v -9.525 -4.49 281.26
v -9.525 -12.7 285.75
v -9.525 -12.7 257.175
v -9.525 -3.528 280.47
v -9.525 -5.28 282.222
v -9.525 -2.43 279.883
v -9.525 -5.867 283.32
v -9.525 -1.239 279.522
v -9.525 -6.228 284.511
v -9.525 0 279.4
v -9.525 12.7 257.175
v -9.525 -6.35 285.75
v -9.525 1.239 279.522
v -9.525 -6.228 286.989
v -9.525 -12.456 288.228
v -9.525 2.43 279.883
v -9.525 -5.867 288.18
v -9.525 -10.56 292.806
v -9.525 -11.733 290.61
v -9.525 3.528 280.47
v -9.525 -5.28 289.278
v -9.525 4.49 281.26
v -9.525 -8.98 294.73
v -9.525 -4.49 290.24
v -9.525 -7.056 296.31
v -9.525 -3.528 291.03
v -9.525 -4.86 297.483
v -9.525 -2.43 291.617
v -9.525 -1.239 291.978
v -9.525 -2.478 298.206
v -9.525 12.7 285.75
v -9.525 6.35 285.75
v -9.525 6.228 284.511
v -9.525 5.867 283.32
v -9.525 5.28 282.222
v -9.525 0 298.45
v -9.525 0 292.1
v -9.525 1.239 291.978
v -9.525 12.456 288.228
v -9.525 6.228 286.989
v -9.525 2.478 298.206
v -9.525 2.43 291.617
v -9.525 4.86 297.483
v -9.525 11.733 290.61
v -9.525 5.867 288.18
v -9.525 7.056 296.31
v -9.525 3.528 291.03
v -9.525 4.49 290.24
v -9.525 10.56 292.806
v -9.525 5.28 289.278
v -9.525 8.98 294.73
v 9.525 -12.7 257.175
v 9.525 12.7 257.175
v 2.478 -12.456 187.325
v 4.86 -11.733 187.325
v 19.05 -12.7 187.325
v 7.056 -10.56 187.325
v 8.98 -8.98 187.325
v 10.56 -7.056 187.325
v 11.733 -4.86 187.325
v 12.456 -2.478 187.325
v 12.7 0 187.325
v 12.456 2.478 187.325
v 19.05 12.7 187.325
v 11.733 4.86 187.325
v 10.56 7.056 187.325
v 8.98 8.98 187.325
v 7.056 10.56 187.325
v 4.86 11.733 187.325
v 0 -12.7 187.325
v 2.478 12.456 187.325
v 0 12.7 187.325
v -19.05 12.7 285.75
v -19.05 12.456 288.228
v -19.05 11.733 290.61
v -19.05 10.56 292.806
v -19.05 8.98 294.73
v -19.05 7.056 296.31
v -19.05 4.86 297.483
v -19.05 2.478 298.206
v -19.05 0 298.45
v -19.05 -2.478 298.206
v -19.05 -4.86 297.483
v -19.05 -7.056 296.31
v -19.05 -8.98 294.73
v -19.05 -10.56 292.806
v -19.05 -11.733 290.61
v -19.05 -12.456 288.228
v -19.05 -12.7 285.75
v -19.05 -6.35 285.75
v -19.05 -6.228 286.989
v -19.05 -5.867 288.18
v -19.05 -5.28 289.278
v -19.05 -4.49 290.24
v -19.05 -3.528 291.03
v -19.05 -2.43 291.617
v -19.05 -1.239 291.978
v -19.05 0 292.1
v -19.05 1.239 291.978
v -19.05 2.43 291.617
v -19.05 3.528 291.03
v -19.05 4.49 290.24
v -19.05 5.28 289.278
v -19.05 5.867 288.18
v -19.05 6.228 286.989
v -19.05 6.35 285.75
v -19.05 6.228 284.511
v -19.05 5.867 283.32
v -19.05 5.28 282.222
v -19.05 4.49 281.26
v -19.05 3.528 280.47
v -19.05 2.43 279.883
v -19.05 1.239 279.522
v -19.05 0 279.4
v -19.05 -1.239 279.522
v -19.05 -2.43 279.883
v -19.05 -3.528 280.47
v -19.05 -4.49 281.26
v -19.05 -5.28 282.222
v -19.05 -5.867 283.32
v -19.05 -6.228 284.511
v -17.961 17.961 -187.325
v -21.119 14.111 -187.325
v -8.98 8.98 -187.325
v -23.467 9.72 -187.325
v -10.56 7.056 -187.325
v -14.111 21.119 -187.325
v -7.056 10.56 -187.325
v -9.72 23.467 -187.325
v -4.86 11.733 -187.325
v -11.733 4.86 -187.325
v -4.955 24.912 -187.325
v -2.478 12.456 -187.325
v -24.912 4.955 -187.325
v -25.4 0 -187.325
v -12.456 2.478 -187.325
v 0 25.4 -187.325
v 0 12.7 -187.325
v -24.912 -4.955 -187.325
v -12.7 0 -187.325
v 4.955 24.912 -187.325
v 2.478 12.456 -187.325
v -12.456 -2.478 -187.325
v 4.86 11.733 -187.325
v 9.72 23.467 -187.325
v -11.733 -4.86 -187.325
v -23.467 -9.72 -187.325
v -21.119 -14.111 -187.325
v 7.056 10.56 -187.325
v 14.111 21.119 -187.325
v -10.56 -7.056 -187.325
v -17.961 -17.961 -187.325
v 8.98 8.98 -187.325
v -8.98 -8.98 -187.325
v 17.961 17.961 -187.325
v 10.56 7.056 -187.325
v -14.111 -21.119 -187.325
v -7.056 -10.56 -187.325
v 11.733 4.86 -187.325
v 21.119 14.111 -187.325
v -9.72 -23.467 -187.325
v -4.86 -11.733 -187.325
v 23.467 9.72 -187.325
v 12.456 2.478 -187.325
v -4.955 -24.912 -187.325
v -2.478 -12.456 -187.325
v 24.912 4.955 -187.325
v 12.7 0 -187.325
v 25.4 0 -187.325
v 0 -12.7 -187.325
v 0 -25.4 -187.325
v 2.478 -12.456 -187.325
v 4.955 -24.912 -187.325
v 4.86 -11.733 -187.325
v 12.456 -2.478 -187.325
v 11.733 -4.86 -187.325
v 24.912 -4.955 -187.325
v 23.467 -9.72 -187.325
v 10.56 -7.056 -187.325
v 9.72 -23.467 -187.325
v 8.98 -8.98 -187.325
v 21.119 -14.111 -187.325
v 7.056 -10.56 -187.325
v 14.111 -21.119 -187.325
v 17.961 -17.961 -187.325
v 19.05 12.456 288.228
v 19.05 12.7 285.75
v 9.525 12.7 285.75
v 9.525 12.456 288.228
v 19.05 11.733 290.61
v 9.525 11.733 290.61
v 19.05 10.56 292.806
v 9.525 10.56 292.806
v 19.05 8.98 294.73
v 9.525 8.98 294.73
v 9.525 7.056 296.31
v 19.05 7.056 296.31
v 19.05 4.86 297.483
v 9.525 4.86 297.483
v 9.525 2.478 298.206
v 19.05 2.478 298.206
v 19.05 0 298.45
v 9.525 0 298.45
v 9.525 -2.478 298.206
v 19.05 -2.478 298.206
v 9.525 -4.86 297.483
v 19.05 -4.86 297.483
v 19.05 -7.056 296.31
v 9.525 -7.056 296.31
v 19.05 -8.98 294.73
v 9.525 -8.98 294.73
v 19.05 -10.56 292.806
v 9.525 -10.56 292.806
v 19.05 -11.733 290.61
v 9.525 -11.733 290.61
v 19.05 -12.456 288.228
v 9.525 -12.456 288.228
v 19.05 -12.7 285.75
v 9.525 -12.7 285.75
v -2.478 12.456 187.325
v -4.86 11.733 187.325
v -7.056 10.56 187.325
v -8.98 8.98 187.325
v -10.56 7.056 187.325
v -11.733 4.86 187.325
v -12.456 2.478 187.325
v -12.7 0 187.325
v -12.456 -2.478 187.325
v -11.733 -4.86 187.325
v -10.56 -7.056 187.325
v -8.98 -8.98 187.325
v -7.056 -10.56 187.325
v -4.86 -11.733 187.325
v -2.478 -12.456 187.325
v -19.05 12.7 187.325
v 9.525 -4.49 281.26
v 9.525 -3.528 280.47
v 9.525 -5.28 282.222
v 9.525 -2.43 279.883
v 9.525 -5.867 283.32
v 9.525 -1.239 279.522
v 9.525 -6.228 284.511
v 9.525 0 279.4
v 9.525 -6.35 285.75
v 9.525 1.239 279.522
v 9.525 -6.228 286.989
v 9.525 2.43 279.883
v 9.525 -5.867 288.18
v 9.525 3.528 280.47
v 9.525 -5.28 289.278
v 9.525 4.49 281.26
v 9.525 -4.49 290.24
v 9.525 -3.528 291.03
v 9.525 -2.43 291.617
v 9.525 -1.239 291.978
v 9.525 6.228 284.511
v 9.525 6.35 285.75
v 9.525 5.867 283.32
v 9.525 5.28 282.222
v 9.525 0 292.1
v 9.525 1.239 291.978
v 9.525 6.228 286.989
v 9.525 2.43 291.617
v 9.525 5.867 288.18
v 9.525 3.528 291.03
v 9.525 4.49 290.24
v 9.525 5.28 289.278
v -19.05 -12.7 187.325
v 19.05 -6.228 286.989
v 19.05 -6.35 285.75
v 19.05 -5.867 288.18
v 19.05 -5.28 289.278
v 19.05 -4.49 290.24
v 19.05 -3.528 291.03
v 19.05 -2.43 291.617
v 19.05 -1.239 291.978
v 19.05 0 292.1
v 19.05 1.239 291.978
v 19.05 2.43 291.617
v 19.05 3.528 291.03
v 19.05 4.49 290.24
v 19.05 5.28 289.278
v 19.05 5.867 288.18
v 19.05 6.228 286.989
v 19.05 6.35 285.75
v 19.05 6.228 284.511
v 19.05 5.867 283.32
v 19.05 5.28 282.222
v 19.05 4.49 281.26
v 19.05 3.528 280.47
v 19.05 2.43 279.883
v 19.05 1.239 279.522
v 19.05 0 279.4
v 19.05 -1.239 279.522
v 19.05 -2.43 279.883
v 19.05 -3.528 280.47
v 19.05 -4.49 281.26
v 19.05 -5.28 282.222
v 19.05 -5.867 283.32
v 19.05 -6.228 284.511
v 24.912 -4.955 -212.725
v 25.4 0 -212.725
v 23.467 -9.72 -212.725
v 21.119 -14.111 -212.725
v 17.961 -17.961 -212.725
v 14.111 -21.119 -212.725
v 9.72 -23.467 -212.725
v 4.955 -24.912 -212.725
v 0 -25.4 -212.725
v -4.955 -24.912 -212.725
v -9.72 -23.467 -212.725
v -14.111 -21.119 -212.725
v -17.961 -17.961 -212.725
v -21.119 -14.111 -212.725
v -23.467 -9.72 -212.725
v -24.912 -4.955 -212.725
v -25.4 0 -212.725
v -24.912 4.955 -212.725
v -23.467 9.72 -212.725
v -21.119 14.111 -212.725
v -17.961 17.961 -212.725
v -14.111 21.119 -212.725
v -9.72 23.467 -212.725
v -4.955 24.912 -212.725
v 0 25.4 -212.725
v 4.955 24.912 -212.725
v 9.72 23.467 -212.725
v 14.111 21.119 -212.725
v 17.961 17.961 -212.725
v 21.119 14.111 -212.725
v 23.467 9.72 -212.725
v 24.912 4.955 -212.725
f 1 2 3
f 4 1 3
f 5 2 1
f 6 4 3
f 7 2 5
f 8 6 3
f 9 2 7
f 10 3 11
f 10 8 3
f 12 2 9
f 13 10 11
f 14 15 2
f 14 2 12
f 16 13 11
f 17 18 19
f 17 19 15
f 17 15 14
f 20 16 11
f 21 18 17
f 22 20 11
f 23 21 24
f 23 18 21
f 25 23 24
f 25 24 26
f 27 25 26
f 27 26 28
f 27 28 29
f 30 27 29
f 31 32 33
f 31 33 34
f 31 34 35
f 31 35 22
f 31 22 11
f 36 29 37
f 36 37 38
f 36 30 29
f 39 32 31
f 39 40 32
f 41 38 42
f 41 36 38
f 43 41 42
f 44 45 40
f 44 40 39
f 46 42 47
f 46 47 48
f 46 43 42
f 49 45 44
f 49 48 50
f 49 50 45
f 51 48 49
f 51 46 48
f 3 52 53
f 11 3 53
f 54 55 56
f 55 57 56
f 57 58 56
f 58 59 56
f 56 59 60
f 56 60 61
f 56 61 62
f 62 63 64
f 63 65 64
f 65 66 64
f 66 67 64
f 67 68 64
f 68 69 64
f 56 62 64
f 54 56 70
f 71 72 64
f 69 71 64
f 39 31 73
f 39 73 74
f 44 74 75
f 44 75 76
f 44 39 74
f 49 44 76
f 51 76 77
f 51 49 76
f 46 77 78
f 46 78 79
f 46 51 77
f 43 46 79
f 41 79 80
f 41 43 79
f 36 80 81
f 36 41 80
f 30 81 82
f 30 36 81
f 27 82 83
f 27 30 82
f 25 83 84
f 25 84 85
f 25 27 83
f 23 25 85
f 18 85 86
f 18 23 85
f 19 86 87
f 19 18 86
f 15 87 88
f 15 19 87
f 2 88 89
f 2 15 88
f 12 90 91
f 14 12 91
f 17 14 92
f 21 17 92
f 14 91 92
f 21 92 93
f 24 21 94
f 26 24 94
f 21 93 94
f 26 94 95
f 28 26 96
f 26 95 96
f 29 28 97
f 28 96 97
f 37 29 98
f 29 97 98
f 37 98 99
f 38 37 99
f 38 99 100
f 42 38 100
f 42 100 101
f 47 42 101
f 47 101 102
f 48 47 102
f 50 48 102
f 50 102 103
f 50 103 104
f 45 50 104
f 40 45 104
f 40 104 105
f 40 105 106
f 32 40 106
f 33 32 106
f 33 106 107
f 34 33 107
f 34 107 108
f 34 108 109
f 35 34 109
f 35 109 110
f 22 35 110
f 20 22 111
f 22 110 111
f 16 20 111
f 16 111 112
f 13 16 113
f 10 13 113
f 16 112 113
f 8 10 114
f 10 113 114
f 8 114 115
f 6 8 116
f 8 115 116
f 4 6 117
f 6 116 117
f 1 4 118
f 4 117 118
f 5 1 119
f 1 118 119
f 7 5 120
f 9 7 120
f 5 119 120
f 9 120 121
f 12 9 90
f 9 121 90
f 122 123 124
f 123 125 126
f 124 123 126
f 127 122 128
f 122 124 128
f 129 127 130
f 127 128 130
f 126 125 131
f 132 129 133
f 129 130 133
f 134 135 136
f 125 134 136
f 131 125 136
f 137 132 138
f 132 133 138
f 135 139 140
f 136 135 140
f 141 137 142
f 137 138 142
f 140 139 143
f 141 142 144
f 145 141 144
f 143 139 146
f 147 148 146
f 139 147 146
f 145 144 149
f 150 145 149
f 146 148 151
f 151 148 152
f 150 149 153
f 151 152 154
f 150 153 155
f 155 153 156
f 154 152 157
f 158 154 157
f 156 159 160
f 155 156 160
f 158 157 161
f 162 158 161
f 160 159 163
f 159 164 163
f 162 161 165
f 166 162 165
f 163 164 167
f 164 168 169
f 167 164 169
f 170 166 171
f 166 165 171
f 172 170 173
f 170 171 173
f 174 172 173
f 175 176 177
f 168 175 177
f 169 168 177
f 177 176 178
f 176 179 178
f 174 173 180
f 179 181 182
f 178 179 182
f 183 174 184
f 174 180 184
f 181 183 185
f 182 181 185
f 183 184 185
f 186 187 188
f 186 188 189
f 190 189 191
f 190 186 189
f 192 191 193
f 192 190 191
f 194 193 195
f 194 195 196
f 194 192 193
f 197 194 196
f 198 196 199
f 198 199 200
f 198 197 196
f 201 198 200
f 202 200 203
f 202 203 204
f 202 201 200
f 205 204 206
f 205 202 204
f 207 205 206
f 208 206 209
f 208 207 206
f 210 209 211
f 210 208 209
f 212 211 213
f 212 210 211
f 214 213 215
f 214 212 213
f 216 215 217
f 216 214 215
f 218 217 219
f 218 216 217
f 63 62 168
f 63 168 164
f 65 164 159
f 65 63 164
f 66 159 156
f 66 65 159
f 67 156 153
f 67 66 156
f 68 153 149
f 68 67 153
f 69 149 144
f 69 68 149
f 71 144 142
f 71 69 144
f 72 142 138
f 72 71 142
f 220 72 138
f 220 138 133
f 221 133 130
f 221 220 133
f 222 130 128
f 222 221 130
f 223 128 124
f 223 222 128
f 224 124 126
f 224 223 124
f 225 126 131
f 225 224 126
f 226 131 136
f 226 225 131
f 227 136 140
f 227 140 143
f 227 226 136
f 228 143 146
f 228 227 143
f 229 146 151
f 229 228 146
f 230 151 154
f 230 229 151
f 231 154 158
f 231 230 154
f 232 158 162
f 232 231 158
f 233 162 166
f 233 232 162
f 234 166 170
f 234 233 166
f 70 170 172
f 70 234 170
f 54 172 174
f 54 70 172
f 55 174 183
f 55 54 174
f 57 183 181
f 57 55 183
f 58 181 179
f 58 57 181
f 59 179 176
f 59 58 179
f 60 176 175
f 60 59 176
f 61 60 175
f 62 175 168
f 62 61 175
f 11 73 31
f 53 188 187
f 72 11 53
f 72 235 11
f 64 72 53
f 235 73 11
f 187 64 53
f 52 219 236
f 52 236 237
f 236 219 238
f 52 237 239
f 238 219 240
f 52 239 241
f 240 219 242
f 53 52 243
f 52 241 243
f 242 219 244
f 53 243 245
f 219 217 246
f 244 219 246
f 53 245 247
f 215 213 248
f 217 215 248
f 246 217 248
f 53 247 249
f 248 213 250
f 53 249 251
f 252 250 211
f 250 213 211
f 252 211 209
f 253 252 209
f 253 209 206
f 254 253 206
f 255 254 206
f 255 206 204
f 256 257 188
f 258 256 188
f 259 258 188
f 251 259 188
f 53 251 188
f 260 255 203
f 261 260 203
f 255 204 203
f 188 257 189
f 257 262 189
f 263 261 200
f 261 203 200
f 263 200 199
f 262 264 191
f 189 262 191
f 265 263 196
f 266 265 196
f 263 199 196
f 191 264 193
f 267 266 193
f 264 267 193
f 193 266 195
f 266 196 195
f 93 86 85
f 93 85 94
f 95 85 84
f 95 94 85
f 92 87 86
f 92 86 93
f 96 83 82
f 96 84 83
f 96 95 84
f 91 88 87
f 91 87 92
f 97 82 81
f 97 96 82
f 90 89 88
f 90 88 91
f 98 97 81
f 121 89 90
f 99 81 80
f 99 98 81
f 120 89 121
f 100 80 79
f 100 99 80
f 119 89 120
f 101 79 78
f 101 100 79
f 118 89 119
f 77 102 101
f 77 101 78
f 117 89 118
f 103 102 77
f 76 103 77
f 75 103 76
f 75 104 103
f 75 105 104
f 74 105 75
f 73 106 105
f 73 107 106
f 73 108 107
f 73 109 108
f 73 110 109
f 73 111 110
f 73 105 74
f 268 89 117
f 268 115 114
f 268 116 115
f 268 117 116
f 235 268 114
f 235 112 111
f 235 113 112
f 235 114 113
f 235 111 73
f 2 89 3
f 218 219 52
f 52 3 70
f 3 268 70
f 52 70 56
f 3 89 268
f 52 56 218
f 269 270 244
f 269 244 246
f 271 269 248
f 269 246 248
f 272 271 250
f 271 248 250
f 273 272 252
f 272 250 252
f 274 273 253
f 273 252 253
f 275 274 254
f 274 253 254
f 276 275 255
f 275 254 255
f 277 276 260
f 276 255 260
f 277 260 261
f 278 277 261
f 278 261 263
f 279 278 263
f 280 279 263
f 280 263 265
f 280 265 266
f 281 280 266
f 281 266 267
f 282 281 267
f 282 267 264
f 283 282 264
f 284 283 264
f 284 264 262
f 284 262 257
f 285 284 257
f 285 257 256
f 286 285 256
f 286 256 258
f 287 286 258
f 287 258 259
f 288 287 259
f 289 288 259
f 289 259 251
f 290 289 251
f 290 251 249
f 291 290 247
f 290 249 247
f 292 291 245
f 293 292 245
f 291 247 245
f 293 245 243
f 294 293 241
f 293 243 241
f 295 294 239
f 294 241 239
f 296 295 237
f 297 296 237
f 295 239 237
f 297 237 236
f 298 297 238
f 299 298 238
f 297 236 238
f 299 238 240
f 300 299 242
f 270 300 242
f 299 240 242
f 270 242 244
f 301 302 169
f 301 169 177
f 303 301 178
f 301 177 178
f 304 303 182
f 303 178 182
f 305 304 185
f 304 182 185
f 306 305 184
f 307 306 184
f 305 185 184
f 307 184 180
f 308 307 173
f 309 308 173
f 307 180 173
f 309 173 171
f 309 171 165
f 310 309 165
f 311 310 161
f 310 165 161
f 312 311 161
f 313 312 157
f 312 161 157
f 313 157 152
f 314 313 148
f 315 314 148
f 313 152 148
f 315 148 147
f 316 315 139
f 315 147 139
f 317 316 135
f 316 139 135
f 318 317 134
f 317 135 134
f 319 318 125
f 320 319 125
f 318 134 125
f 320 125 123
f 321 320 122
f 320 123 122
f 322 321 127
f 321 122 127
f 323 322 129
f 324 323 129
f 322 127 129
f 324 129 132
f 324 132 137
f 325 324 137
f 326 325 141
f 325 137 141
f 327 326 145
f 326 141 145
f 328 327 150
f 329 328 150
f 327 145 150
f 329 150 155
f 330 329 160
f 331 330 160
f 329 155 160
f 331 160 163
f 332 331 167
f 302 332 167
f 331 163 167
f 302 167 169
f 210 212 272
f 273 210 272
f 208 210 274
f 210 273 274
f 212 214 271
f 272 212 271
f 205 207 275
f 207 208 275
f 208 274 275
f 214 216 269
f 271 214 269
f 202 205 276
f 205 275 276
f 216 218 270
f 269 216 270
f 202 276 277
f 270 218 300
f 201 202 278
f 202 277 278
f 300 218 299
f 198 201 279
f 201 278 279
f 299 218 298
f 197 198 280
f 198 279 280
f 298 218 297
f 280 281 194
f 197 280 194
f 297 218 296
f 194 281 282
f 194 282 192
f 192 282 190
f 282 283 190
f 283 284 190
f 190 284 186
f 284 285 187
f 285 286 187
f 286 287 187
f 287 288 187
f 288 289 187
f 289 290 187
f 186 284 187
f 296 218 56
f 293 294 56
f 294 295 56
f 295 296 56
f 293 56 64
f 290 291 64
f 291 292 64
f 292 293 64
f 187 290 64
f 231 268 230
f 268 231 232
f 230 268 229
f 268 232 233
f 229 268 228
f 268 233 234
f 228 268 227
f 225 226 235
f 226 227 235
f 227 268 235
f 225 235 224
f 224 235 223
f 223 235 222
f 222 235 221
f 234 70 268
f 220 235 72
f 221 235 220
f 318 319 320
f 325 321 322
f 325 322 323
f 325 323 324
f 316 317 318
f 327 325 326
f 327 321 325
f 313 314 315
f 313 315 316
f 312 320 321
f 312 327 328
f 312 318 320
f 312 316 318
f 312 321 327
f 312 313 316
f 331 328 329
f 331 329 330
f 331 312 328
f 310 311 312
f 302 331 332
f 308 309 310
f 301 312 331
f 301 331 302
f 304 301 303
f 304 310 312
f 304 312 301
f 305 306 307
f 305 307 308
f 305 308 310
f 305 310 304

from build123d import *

# Parameters (mm, degrees)
F0_R      = 12.7
F1_DEPTH  = 187.325
F3_W      = 38.1
F3_H      = 25.4
F4_DEPTH  = 98.425
F5_W      = 38.1
F5_H      = 12.7
F8_D      = 12.7
F9_R      = 25.4
F10_DEPTH = 25.4
F11_W     = 125.786887
F11_H     = 48.075629
F12_DEPTH = 9.525


with BuildPart() as f1:
    # F0 (on Top) → F1 (new body, symmetric)
    with BuildSketch(Plane.XY):
        Circle(F0_R)
    extrude(amount=F1_DEPTH, both=True)

    # F3 (on offset) → F4 (join)
    with BuildSketch(Plane.XY.offset(187.325)):
        Rectangle(F3_W, F3_H)
    extrude(amount=F4_DEPTH)

    # F5 (on face) → F6 (revolve)
    with BuildSketch(Plane.XY.offset(285.75)):
        with Locations((0, 6.35)):
            Rectangle(F5_W, F5_H)
    revolve(axis=Axis((0, 0, 285.75), (1, 0, 0)))

    # F8 (through all)
    with Locations(Plane.YZ.offset(19.05)):
        with Locations((0, 285.75)):
            Hole(F8_D / 2)

    # F9 (on face) → F10 (join)
    with BuildSketch(Plane(origin=(0, 0, -187.325), x_dir=(1, 0, 0), z_dir=(0, 0, -1))):
        Circle(F9_R)
    extrude(amount=F10_DEPTH)

    # F11 (on Right) → F12 (cut, symmetric)
    with BuildSketch(Plane.YZ):
        with Locations((7.106817, 281.212815)):
            Rectangle(F11_W, F11_H)
    extrude(amount=F12_DEPTH, both=True, mode=Mode.SUBTRACT)


solid = f1.part
